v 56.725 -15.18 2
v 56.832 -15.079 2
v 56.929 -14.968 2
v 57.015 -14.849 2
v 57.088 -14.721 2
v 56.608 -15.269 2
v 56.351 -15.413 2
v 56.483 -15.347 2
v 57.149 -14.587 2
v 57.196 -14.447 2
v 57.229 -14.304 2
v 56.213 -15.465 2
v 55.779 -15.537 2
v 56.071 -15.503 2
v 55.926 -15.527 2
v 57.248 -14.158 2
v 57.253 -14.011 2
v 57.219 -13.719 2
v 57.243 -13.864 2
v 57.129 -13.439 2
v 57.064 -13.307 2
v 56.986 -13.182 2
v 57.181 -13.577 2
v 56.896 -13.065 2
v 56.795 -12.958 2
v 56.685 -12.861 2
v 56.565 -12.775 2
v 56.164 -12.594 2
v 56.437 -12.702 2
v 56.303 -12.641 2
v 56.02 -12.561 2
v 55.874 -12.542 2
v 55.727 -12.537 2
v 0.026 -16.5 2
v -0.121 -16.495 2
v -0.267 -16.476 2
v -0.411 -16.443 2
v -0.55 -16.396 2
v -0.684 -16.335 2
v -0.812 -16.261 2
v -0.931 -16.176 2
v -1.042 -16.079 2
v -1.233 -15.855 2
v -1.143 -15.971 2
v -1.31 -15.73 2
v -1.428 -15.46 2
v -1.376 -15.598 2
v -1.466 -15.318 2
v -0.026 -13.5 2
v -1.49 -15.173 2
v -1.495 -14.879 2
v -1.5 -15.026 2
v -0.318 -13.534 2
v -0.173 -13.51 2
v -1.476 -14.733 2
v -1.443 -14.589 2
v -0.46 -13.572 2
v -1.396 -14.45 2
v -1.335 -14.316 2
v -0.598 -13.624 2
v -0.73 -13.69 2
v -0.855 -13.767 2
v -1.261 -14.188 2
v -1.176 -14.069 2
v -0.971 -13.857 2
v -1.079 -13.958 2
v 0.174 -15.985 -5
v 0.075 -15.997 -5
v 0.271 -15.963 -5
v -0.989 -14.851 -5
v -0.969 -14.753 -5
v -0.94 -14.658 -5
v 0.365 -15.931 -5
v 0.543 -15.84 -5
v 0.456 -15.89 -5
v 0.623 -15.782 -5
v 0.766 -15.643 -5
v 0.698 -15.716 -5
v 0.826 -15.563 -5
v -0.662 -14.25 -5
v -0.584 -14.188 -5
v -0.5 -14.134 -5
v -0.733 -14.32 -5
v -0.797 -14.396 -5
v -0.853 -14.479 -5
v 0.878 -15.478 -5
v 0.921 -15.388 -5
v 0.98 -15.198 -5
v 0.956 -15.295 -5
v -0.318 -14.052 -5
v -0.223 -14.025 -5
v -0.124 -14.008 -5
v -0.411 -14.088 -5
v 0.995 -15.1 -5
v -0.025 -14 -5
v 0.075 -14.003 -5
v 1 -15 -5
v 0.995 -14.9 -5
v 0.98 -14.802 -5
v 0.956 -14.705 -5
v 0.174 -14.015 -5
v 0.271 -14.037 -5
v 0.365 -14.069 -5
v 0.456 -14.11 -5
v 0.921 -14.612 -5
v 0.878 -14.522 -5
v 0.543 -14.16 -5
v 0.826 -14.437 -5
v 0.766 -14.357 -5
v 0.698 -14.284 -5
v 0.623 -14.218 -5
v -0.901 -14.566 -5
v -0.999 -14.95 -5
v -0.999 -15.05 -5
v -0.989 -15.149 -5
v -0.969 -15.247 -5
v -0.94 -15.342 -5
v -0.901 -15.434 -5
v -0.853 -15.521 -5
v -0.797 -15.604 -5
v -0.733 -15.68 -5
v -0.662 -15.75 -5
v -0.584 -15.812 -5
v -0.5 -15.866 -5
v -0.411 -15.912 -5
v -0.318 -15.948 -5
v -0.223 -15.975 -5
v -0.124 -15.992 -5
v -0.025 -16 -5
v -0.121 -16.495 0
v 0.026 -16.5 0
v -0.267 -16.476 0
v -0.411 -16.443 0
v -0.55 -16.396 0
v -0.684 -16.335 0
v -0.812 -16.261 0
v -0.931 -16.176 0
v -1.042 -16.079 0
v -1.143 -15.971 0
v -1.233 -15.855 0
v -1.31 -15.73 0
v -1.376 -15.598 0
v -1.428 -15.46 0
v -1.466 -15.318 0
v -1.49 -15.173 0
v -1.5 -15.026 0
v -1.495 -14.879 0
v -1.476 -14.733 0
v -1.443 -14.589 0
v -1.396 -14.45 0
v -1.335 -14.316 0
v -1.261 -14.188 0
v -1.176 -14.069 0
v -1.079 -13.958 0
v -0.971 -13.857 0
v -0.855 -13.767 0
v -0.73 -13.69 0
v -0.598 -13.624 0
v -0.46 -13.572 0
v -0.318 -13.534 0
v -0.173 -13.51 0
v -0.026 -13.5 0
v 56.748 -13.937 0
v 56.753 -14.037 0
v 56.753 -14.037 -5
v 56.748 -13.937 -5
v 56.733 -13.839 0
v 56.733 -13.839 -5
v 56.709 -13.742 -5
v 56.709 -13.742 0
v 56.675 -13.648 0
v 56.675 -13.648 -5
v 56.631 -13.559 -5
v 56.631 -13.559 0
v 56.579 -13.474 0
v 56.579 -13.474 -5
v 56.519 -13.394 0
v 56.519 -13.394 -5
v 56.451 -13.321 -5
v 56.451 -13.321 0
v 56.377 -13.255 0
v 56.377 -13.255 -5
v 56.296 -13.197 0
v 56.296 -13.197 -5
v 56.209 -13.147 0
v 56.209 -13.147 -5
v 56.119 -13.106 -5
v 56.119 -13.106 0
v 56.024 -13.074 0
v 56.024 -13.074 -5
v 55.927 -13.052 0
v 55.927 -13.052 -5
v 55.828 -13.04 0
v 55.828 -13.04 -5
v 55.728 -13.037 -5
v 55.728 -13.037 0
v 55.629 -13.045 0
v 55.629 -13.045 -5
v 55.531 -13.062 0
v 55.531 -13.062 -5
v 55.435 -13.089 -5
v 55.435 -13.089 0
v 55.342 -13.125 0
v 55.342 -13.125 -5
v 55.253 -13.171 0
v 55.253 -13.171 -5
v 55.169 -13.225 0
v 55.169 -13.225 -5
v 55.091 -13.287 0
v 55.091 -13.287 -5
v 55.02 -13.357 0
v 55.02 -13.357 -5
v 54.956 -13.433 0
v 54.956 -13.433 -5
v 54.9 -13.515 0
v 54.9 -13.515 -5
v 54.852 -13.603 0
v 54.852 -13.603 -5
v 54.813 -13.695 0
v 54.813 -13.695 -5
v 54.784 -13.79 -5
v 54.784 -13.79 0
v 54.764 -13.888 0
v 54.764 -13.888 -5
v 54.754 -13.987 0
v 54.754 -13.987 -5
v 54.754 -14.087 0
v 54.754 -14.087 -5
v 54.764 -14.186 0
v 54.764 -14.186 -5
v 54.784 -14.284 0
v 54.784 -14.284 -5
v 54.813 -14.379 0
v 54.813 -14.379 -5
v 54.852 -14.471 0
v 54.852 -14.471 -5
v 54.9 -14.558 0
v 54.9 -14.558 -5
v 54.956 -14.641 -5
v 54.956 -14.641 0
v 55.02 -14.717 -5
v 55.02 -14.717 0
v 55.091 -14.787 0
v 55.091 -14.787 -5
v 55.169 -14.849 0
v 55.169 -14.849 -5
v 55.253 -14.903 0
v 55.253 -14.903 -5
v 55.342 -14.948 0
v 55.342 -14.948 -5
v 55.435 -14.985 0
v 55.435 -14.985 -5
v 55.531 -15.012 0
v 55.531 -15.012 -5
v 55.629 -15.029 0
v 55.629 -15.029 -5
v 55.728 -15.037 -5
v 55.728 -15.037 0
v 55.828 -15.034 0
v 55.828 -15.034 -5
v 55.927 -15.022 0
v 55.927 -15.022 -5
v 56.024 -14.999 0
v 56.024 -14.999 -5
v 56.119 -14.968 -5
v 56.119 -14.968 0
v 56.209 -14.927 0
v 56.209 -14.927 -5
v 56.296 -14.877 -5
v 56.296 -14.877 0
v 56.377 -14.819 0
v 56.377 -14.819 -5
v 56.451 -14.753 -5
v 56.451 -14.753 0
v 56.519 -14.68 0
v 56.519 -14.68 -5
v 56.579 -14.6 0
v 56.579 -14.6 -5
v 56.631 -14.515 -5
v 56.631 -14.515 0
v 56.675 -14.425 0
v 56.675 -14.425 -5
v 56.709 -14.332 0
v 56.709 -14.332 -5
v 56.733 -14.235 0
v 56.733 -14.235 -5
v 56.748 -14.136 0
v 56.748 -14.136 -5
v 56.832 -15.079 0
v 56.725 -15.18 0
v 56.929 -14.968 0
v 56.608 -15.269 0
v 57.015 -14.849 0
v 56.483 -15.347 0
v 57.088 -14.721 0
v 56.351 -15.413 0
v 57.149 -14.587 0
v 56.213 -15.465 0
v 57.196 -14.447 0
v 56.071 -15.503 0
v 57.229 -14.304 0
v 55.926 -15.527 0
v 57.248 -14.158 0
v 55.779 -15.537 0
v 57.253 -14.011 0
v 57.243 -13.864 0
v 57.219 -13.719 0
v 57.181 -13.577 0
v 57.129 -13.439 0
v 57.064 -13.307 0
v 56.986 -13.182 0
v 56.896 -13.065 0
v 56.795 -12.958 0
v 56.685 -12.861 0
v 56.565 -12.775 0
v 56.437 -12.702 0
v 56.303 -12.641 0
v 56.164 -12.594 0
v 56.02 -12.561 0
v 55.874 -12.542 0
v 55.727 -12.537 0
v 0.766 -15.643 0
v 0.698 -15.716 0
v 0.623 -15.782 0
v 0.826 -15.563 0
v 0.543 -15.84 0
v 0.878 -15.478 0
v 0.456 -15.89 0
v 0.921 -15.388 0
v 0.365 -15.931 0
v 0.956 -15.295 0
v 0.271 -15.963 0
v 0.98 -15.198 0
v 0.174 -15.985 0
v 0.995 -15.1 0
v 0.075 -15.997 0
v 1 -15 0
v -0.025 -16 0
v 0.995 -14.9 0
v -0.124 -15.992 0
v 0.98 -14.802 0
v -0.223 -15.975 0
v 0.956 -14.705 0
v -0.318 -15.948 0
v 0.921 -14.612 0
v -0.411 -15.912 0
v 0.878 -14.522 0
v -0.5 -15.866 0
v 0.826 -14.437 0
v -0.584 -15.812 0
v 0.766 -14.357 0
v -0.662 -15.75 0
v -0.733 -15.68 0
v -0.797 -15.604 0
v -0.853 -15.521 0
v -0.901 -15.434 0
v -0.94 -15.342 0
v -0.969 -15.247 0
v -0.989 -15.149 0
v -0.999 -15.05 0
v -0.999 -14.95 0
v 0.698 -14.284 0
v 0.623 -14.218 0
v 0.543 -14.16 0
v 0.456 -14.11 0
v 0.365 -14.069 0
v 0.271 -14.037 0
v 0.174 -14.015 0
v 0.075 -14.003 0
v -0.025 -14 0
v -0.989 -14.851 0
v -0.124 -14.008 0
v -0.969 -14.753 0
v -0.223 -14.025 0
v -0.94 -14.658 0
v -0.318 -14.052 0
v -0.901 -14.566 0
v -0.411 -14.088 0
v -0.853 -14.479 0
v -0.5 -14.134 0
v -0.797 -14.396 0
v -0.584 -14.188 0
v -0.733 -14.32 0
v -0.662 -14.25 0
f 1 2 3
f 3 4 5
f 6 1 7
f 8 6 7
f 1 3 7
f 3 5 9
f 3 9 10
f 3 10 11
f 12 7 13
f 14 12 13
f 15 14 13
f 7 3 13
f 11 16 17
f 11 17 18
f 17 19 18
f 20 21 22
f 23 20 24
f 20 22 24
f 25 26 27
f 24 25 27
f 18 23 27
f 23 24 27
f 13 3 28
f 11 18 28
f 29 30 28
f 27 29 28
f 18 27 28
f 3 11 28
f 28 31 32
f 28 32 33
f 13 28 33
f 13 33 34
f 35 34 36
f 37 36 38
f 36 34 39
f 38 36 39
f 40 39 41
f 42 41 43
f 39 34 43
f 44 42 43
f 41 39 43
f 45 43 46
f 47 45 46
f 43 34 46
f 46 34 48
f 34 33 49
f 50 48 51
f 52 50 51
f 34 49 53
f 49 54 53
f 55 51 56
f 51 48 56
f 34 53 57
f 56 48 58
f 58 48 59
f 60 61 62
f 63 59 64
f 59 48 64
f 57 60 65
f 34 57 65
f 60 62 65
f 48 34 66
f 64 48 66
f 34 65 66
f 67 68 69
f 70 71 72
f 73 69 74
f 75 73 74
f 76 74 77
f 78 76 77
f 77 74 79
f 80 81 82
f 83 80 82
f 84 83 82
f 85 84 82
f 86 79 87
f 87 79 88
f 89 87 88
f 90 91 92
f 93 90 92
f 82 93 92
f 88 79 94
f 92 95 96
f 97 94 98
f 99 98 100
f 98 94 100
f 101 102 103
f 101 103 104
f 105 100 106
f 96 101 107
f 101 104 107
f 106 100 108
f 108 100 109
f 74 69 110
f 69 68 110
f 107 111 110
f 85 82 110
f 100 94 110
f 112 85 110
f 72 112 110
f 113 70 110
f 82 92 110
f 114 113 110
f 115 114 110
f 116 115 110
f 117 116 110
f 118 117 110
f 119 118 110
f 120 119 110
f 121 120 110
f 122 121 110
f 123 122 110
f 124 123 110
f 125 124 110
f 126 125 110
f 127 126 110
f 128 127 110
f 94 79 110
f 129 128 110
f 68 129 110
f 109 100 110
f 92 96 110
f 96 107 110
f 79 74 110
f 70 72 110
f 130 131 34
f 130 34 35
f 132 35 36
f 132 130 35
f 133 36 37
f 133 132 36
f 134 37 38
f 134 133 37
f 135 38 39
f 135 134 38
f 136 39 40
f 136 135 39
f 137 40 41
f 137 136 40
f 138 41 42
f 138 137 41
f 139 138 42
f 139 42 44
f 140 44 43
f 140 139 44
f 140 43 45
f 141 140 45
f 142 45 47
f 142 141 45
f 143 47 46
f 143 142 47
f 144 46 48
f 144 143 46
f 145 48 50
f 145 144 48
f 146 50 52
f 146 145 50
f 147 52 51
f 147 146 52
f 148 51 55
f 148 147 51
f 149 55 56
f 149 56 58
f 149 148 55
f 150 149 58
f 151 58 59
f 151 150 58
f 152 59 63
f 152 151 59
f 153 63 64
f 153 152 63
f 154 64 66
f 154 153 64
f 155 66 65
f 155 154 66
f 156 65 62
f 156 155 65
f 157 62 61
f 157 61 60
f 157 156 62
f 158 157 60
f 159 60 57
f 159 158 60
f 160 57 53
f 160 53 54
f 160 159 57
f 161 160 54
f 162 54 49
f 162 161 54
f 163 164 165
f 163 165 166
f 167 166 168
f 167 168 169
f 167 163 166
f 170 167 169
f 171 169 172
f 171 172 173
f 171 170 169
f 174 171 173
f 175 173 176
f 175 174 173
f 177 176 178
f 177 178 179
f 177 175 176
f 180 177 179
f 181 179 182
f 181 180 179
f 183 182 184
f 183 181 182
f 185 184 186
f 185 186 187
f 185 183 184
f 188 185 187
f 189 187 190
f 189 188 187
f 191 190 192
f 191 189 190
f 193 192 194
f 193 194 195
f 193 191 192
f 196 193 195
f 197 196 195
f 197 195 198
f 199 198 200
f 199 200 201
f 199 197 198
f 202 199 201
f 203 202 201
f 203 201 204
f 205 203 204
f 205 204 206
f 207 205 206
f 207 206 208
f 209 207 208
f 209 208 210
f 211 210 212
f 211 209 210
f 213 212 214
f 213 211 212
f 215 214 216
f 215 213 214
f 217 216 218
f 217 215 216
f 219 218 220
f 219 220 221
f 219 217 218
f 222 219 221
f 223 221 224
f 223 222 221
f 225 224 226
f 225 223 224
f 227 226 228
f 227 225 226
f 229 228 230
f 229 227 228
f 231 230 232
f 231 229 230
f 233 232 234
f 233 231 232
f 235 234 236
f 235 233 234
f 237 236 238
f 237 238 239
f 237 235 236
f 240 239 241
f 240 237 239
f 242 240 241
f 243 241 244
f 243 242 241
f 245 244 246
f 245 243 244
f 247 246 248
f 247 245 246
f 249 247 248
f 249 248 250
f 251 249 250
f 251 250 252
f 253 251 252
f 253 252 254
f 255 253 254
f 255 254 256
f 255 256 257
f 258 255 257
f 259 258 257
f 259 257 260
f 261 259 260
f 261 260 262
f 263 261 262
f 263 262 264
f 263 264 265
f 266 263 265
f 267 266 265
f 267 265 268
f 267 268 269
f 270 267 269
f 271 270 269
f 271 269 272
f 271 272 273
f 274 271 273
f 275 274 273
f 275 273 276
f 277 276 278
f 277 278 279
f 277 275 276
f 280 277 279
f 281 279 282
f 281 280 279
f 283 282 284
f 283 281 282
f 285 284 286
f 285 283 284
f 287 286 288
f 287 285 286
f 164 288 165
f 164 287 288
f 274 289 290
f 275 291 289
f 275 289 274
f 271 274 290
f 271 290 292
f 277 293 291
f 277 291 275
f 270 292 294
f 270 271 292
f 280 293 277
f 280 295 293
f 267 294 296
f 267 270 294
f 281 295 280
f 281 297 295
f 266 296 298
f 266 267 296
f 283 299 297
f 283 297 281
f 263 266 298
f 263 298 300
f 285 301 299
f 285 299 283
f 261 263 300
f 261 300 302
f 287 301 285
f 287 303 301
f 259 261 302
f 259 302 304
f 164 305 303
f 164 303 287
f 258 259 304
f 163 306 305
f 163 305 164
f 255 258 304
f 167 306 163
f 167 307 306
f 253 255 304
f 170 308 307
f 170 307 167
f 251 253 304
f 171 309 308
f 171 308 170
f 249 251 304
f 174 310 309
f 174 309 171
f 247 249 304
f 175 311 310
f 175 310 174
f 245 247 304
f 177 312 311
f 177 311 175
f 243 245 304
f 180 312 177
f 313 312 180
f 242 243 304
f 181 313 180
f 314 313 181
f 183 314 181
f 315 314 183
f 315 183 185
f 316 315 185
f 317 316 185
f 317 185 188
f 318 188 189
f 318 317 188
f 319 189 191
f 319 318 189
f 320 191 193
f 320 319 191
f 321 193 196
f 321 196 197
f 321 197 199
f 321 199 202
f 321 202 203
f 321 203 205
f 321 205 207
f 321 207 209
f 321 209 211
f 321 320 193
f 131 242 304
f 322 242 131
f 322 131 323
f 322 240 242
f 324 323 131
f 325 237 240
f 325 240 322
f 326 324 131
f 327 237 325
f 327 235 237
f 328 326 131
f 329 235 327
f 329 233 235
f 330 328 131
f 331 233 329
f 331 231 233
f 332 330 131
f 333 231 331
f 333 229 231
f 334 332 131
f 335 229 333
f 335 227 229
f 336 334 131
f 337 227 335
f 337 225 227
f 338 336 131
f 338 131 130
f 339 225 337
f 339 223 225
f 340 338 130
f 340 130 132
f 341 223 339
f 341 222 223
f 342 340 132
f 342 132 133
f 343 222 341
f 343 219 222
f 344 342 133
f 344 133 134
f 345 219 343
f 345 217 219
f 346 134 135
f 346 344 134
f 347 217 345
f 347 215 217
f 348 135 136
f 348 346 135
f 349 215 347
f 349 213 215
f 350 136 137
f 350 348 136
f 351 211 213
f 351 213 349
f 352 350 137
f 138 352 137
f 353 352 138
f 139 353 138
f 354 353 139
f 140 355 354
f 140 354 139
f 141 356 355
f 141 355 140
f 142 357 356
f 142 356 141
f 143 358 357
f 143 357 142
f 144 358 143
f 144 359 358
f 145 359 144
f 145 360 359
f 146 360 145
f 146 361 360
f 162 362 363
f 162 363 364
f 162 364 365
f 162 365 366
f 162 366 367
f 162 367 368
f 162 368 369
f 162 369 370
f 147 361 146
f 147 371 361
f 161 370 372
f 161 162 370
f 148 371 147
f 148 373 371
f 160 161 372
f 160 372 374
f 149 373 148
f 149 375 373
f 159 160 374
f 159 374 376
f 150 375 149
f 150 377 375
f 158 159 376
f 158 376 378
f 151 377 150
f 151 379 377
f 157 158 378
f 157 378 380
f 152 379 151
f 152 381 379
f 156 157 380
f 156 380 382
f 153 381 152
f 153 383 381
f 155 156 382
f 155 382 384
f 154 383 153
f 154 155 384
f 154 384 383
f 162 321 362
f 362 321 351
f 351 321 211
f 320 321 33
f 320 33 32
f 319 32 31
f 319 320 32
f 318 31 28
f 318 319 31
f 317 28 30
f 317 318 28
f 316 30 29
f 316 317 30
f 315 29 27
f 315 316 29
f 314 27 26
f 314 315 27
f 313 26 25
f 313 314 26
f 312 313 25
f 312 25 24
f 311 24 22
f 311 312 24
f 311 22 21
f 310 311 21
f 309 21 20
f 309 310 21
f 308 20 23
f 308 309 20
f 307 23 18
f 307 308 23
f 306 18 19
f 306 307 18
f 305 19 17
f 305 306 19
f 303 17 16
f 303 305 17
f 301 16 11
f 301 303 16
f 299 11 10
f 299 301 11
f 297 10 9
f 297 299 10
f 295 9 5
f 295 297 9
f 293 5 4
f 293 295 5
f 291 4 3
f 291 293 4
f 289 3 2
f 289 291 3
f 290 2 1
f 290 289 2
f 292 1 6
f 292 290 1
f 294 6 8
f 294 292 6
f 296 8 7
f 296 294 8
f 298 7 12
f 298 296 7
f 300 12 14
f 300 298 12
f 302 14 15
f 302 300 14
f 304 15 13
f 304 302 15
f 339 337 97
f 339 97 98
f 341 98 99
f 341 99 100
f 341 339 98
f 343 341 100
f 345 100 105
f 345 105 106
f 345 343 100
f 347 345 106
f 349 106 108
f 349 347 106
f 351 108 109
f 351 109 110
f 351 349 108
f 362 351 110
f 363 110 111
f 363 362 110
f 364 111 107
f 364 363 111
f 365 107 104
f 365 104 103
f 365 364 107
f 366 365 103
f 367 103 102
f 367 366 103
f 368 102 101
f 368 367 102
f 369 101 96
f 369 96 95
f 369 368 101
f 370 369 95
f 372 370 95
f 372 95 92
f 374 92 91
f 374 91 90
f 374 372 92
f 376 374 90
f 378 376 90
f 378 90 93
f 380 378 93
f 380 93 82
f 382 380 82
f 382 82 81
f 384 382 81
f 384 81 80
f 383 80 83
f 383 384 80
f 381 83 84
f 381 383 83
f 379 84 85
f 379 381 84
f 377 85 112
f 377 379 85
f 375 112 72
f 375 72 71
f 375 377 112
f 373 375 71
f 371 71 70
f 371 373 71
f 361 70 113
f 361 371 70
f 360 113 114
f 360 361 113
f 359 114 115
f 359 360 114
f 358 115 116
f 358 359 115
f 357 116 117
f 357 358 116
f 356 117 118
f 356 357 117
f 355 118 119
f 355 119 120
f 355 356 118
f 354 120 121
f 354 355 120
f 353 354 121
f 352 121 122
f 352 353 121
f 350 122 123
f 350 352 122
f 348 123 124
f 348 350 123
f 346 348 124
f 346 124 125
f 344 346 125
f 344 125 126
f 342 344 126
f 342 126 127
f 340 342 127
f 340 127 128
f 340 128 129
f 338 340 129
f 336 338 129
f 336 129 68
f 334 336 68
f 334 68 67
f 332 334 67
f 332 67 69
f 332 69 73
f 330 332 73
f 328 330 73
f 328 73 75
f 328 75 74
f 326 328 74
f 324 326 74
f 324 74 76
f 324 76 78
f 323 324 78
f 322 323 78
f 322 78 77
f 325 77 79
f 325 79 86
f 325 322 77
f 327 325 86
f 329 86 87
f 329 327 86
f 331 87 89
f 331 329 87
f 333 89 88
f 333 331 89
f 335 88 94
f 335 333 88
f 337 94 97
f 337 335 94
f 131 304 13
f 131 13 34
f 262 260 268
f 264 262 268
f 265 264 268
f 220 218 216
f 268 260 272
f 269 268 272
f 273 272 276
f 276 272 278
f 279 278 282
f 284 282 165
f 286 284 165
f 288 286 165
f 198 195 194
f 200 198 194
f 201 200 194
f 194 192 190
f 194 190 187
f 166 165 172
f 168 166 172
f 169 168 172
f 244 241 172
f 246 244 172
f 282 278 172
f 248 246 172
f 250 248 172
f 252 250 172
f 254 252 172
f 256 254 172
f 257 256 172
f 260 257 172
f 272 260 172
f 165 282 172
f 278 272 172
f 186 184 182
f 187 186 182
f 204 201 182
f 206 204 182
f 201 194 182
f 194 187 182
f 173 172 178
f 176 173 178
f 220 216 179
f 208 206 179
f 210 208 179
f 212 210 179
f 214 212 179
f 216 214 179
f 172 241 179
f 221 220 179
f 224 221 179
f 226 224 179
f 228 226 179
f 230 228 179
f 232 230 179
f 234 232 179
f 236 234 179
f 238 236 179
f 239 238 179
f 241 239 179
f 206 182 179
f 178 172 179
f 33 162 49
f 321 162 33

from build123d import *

# Parameters (mm, degrees)
BOSS_EXTRUDE1_DEPTH = 2
SKETCH1_3_R         = 1
BOSS_EXTRUDE2_DEPTH = 5


with BuildPart() as part:
    # Sketch1 → Boss-Extrude1 (new body)
    with BuildSketch(Plane.XY):
        with BuildLine():
            Line((-0.025909327, -13.500223781), (55.727261904, -12.537061992))
            ThreePointArc((55.727261904, -12.537061992), (57.25294745, -14.010928883), (55.779080559, -15.536614429))
            Line((55.779080559, -15.536614429), (0.025909327, -16.499776219))
            ThreePointArc((0.025909327, -16.499776219), (-1.499776219, -15.025909327), (-0.025909327, -13.500223781))
        make_face()
    extrude(amount=BOSS_EXTRUDE1_DEPTH)

    # Sketch1<3> → Boss-Extrude2 (add)
    with BuildSketch(Plane.XY):
        with Locations((0, -15)):
            Circle(SKETCH1_3_R)
        with Locations((55.753171232, -14.03683821)):
            Circle(SKETCH1_3_R)
    extrude(amount=-BOSS_EXTRUDE2_DEPTH)


solid = part.part
